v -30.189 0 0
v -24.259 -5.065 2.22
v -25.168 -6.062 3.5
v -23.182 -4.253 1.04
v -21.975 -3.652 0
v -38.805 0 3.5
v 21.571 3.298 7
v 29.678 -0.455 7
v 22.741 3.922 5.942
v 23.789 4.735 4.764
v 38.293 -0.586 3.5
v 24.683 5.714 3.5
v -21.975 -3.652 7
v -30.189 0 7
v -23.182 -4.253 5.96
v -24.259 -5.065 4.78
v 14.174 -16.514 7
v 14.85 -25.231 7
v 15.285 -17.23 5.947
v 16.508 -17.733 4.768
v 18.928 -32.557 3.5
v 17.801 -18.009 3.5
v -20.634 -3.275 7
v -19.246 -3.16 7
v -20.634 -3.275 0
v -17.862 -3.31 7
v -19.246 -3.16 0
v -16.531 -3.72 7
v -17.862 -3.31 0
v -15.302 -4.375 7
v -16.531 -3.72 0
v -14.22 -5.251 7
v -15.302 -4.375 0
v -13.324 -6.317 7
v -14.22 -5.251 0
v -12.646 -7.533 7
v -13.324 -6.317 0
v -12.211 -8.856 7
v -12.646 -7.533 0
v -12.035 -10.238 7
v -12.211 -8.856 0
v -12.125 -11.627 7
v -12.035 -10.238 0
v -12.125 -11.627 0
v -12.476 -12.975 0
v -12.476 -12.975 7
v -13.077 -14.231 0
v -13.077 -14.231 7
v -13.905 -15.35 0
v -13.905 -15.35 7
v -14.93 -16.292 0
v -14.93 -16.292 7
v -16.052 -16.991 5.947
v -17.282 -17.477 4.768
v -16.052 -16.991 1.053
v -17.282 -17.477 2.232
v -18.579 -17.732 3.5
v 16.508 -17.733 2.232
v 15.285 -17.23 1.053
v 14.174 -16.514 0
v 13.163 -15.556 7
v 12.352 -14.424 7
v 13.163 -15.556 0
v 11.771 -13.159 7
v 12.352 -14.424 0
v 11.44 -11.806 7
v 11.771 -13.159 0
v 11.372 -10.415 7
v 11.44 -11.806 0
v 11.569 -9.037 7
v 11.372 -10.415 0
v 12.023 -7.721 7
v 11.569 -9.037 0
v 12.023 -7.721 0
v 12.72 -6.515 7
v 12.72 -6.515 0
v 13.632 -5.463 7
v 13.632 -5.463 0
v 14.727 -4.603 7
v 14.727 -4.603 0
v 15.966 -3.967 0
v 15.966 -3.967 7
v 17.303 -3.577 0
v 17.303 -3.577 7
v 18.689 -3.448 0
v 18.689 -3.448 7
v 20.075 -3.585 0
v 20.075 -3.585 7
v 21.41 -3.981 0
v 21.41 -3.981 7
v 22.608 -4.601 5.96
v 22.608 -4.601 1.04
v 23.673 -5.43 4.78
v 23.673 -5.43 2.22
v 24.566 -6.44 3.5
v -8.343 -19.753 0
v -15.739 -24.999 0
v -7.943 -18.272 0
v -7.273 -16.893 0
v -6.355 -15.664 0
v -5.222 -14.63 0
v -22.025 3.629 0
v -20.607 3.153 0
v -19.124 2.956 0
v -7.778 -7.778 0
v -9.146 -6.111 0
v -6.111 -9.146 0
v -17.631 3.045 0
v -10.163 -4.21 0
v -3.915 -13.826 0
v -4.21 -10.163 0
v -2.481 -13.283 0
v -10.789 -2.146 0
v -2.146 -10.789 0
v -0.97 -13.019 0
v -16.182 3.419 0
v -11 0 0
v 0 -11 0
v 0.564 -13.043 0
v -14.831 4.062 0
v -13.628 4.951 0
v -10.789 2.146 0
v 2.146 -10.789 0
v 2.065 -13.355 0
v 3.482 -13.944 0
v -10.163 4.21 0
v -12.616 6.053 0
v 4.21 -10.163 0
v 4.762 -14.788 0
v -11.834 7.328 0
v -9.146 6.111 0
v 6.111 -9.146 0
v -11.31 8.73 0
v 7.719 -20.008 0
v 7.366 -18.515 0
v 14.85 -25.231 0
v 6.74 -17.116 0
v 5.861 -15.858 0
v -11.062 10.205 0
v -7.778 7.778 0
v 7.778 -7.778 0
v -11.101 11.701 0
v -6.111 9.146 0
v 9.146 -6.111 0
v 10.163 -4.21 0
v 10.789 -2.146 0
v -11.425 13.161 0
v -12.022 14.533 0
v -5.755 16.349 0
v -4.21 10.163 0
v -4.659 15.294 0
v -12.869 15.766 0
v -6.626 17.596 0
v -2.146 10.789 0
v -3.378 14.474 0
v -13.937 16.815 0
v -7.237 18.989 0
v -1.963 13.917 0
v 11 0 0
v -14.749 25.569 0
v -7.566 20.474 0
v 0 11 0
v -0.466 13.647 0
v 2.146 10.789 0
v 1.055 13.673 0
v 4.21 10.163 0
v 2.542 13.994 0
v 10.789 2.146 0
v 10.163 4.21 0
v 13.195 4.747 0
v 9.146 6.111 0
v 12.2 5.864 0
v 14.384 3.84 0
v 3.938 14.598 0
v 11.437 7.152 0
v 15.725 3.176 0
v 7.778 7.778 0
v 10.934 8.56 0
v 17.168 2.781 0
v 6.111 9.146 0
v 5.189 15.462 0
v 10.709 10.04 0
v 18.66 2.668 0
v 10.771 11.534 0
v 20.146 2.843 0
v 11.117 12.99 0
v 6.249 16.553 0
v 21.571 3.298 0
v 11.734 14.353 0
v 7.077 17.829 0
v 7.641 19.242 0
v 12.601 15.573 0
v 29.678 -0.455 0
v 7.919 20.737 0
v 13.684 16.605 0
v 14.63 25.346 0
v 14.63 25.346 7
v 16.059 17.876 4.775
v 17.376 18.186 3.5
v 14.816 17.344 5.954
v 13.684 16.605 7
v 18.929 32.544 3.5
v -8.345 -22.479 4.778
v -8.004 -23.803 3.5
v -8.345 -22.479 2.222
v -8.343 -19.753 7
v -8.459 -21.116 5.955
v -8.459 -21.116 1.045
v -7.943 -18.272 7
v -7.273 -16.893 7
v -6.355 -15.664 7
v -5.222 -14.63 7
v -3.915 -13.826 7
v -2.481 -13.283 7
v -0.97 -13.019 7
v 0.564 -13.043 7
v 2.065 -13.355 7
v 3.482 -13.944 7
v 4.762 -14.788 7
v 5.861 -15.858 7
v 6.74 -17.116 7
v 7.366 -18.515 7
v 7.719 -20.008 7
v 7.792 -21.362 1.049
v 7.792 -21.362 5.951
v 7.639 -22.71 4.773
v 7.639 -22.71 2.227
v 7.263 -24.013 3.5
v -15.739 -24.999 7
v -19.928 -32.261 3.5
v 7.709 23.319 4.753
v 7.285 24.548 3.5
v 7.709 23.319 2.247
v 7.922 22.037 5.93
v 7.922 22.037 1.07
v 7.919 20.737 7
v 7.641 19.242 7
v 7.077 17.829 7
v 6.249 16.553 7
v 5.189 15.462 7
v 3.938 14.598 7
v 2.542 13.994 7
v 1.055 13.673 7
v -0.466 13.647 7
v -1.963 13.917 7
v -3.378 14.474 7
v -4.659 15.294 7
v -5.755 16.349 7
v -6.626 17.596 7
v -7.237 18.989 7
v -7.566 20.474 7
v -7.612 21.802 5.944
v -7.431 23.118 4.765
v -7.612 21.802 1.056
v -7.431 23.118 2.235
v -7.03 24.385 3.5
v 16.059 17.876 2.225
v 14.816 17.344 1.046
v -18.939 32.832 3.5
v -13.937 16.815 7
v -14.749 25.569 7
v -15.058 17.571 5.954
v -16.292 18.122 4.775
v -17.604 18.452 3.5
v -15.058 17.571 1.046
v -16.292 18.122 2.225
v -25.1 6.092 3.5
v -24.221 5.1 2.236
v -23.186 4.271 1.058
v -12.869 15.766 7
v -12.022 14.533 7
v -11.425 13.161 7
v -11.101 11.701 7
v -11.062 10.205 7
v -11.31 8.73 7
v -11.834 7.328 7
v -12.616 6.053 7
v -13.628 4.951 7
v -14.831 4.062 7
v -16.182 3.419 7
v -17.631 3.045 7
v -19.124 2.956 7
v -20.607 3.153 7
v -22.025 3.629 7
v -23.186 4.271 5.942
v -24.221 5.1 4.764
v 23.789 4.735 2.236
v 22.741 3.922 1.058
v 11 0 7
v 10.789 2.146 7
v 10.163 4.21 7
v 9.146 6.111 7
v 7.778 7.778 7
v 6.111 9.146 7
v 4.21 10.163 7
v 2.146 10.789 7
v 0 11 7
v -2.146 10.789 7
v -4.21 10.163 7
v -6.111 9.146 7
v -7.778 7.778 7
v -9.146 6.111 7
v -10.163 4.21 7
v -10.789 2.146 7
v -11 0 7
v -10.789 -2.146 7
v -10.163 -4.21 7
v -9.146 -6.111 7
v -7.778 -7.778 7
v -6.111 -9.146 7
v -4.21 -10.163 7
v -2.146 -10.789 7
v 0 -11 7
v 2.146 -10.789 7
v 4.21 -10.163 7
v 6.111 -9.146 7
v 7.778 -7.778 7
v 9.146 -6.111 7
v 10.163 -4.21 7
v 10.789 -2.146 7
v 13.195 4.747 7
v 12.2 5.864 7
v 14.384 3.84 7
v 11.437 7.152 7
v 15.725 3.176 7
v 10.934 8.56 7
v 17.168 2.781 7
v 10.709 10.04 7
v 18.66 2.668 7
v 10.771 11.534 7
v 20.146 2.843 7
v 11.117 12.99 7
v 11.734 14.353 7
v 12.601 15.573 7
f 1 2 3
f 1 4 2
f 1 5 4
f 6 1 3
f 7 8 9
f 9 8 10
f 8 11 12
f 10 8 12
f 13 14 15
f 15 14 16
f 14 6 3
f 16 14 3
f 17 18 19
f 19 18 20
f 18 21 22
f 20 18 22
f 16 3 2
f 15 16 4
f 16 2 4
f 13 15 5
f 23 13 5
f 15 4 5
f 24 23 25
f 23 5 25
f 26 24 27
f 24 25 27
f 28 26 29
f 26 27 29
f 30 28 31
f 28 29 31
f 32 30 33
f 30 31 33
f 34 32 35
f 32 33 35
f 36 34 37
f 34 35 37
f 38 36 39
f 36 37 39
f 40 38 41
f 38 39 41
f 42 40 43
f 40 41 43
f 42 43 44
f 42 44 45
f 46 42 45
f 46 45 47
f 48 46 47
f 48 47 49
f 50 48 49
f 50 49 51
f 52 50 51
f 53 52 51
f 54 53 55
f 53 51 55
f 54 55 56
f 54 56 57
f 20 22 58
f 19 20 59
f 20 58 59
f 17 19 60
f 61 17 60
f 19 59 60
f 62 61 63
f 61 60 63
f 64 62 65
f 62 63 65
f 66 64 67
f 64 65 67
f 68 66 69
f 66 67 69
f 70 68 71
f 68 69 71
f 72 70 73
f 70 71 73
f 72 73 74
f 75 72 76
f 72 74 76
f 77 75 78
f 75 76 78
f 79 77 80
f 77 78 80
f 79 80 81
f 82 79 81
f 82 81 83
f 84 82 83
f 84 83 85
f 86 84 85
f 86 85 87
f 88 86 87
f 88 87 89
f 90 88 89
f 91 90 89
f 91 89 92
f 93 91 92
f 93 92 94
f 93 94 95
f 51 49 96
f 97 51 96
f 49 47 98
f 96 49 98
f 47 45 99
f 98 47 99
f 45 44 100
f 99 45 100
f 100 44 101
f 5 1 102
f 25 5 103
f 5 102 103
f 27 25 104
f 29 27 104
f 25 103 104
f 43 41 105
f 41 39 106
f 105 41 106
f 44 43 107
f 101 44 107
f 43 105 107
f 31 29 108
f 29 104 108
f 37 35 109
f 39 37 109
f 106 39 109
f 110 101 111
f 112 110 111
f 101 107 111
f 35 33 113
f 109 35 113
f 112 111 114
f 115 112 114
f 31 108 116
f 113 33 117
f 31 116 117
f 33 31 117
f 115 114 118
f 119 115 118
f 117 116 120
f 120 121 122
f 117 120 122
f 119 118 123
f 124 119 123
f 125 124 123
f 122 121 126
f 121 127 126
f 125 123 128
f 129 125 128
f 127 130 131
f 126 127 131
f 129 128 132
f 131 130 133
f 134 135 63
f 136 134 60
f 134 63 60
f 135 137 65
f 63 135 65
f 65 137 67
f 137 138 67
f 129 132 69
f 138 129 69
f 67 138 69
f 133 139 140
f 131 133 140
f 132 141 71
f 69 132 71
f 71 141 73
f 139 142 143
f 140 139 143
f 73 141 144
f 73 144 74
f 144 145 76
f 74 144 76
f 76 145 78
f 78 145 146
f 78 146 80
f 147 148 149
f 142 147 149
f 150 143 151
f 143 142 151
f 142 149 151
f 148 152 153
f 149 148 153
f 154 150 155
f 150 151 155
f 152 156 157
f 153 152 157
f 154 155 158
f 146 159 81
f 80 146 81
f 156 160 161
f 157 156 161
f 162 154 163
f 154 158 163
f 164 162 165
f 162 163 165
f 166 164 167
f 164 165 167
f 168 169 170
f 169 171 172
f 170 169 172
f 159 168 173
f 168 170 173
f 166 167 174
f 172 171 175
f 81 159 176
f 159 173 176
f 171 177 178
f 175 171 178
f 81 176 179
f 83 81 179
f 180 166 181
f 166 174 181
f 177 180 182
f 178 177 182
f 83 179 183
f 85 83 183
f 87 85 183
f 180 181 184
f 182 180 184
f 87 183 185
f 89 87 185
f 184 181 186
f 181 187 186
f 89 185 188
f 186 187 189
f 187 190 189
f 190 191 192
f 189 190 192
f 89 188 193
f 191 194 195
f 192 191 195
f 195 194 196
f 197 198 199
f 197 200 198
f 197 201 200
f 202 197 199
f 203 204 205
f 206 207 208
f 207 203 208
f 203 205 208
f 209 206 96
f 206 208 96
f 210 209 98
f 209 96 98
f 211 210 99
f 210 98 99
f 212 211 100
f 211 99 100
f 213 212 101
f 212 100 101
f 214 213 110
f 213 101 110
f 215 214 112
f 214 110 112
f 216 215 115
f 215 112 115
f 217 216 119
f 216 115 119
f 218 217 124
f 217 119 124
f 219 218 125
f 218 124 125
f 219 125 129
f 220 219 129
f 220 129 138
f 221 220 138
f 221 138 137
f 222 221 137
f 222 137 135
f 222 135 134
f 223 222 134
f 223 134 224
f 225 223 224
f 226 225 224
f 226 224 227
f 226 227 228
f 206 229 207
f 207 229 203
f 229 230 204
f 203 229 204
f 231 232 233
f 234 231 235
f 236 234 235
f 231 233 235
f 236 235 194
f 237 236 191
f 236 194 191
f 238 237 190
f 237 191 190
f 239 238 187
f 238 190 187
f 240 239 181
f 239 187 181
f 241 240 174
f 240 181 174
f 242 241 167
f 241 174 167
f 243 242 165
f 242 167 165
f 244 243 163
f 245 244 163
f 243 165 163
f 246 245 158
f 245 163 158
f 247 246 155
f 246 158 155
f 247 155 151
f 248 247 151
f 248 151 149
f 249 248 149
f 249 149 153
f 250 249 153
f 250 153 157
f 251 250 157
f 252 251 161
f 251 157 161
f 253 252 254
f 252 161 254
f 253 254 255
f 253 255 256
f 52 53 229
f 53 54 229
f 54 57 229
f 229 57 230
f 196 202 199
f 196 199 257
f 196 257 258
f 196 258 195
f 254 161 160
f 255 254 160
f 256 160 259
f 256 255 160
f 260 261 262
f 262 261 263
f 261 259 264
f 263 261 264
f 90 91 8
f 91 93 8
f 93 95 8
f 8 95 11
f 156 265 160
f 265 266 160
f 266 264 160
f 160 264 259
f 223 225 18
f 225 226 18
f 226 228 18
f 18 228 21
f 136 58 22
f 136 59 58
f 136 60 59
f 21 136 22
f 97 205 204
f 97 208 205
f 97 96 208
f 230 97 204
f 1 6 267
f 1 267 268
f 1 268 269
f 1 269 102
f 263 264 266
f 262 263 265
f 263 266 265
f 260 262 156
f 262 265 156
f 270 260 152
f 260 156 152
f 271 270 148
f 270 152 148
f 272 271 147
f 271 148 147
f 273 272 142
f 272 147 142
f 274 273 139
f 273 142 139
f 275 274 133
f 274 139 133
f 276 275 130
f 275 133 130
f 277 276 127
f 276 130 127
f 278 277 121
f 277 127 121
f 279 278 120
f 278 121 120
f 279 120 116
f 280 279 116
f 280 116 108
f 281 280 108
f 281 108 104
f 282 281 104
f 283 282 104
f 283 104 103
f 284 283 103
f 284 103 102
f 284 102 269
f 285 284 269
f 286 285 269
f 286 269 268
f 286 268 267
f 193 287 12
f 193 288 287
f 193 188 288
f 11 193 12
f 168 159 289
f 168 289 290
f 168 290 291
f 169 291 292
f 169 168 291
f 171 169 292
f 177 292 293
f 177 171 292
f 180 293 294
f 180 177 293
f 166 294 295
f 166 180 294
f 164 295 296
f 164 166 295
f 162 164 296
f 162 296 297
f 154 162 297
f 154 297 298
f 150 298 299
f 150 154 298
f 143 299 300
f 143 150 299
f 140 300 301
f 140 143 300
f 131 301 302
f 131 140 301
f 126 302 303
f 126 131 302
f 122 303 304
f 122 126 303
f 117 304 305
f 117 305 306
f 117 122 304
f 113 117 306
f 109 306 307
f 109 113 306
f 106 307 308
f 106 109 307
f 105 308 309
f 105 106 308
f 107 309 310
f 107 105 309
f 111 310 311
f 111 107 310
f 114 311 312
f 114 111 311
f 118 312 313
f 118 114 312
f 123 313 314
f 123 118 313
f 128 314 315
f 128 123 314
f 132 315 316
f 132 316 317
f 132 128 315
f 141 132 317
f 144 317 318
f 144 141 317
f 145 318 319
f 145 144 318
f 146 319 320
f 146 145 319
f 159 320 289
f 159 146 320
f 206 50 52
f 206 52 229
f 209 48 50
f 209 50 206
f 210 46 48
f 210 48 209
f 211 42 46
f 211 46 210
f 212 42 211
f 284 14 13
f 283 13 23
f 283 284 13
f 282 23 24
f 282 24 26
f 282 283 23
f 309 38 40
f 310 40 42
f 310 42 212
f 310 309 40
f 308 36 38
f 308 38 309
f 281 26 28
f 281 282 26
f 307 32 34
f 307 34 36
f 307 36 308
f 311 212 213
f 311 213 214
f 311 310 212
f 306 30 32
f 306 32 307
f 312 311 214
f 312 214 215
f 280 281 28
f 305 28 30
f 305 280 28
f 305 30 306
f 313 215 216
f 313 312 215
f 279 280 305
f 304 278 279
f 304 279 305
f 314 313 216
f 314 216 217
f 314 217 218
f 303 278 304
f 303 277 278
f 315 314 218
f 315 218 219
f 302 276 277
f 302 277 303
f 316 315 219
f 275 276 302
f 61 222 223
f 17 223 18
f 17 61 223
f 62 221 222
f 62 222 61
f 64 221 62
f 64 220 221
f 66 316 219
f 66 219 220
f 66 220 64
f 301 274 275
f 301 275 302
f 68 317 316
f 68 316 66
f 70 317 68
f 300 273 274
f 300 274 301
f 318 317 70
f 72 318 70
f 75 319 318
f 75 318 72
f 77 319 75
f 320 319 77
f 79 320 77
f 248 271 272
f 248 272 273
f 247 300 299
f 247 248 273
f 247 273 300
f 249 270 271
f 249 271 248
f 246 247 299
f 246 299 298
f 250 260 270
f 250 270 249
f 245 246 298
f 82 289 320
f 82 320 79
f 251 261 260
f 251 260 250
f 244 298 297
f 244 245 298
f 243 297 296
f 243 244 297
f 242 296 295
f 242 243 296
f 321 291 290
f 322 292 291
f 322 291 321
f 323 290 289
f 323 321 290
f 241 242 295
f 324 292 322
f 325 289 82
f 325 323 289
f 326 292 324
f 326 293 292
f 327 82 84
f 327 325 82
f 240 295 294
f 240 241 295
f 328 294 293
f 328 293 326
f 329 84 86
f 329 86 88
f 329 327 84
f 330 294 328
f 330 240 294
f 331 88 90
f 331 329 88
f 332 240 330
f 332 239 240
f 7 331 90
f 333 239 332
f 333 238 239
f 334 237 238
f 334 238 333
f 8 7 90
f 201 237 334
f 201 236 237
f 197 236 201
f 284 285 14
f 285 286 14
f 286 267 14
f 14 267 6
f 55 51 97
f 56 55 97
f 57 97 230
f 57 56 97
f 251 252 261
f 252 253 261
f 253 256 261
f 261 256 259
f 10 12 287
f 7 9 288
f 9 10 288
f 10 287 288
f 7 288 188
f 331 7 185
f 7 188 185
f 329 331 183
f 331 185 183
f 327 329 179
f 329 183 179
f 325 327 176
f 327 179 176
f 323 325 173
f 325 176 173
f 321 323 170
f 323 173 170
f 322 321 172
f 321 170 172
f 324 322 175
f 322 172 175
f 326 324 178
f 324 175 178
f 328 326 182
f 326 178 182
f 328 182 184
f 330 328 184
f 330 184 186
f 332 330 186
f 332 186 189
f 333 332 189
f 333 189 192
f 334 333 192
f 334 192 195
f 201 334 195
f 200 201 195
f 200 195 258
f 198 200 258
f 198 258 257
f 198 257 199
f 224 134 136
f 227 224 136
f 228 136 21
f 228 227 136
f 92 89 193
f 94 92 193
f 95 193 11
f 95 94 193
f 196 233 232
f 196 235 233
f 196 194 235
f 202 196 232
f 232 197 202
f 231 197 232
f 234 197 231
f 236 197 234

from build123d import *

# Parameters (mm, degrees)
F0_R         = 11
F1_DEPTH     = 7
F2_SIZE      = 3.81
F3_T1_DEPTH  = 34.6394313852
F3_T3_DEPTH  = 34.3439110976
F4_SIZE      = 3.81
F5_T1_DEPTH  = 35.2279158768
F5_T3_DEPTH  = 35.1515641575
F5_T5_DEPTH  = 34.8076073963
F5_T7_DEPTH  = 34.8076073963
F5_T9_DEPTH  = 34.5979192148
F5_T11_DEPTH = 35.1515641575
F5_T13_DEPTH = 35.2279158768
F5_T15_DEPTH = 34.6394313852
F5_T17_DEPTH = 34.8076073963
F6_T1_DEPTH  = 29.7856896268


# Not quite as in the source:
# - a fillet or chamfer that OpenCascade refuses, or shapes differently, is made with other operations: its cross-section is extruded or revolved along the edge and cut away or added


with BuildPart() as f1:
    # F0 (on Top) → F1 (new body)
    with BuildSketch(Plane.XY):
        with BuildLine():
            Line((-19.3098304855, 33.4750442975), (-17.9191186068, 18.4962593726))
            ThreePointArc((-17.9191186068, 18.4962593726), (-12.1734101316, 6.7065768921), (-25.2838117957, 6.35))
            Line((-25.2838117957, 6.35), (-39.5676235915, 0))
            Line((-39.5676235915, 0), (-25.3535799067, -6.3189839441))
            ThreePointArc((-25.3535799067, -6.3189839441), (-12.9763127609, -6.8724869317), (-18.8926645602, -17.7582523592))
            Line((-18.8926645602, -17.7582523592), (-20.2989239466, -32.9044930863))
            Line((-20.2989239466, -32.9044930863), (-7.891724267, -24.1040629982))
            ThreePointArc((-7.891724267, -24.1040629982), (-0.2207247048, -12.9944902326), (7.1436805269, -24.3096295115))
            Line((7.1436805269, -24.3096295115), (19.2464965418, -33.1737534264))
            Line((19.2464965418, -33.1737534264), (19.2872961226, -33.1740312262))
            Line((19.2872961226, -33.1740312262), (18.113880894, -18.0395493303))
            ThreePointArc((18.113880894, -18.0395493303), (12.3636945983, -7.0651033251), (24.7479456966, -6.6998194754))
            Line((24.7479456966, -6.6998194754), (39.056406052, -0.5976429607))
            Line((39.056406052, -0.5976429607), (24.8707754105, 5.9687611329))
            ThreePointArc((24.8707754105, 5.9687611329), (11.7673092468, 6.524596873), (17.6915767021, 18.225572644))
            Line((17.6915767021, 18.225572644), (19.3098304855, 33.1814855899))
            Line((19.3098304855, 33.1814855899), (7.1525325905, 24.8331700857))
            ThreePointArc((7.1525325905, 24.8331700857), (0.2505296838, 13.6219778067), (-6.9026308059, 24.6746142094))
            Line((-6.9026308059, 24.6746142094), (-19.3098304855, 33.4750442975))
        make_face()
        Circle(F0_R, mode=Mode.SUBTRACT)
    extrude(amount=F1_DEPTH)

    # F2
    f2_edges = [f1.edges().sort_by_distance(p)[0] for p in [
        (18.500704, 25.703529, 7),
        (13.231182, 29.007328, 7),
    ]]
    chamfer(f2_edges, length=F2_SIZE)

    # F3: chamfer of 3.81 on 2 edges, made by hand

    # F3_s2 → F3_t1 (cut)
    with BuildSketch(Plane(origin=(1.0999249917, 10.1655145758, 0), x_dir=(0, 0, 1), z_dir=(0.1075737229, 0.9941971103, 0))):
        Polygon((3.81, 15.6283217323), (0, 11.8183217323), (0, 15.6283217323), align=None)
    extrude(amount=F3_T1_DEPTH, mode=Mode.SUBTRACT)

    # F3_s4 → F3_t3 (cut)
    with BuildSketch(Plane(origin=(36.6832724438, 25.190098551, 0), x_dir=(0, 0, 1), z_dir=(-0.8243528709, -0.5660762706, 0))):
        Polygon((0, 12.6124160802), (3.81, 16.4224160802), (0, 16.4224160802), align=None)
    extrude(amount=F3_T3_DEPTH, mode=Mode.SUBTRACT)

    # F4 (call 1 of 6: OpenCascade refuses the feature's edges together)
    f4_edges = [f1.edges().sort_by_distance(p)[0] for p in [
        (31.902176, -3.648731, 7),
        (31.963591, 2.685559, 7),
    ]]
    chamfer(f4_edges, length=F4_SIZE)

    # F4#2 (call 2 of 6)
    f4_2_edges = [f1.edges().sort_by_distance(p)[0] for p in [
        (18.700589, -25.60679, 7),
    ]]
    chamfer(f4_2_edges, length=F4_SIZE)

    # F4#3 (call 3 of 6)
    f4_3_edges = [f1.edges().sort_by_distance(p)[0] for p in [
        (13.195089, -28.741691, 7),
    ]]
    chamfer(f4_3_edges, length=F4_SIZE)

    # F4#4 (call 4 of 6)
    f4_4_edges = [f1.edges().sort_by_distance(p)[0] for p in [
        (-14.095324, -28.504278, 7),
        (-19.595794, -25.331373, 7),
    ]]
    chamfer(f4_4_edges, length=F4_SIZE)

    # F4#5 (call 5 of 6)
    f4_5_edges = [f1.edges().sort_by_distance(p)[0] for p in [
        (-32.460602, -3.159492, 7),
        (-32.425718, 3.175, 7),
    ]]
    chamfer(f4_5_edges, length=F4_SIZE)

    # F4#6 (call 6 of 6)
    f4_6_edges = [f1.edges().sort_by_distance(p)[0] for p in [
        (-18.614475, 25.985652, 7),
        (-13.106231, 29.074829, 7),
    ]]
    chamfer(f4_6_edges, length=F4_SIZE)

    # F5: chamfer of 3.81 on 9 edges, made by hand

    # F5_s2 → F5_t1 (cut)
    with BuildSketch(Plane(origin=(41.2840936669, -19.1100451228, 0), x_dir=(0, 0, 1), z_dir=(-0.9074917218, 0.4200699643, 0))):
        Polygon((0, 12.0540670557), (3.81, 15.8640670557), (0, 15.8640670557), align=None)
    extrude(amount=F5_T1_DEPTH, mode=Mode.SUBTRACT)

    # F5_s4 → F5_t3 (cut)
    with BuildSketch(Plane(origin=(9.5091795604, 4.0554113263, 0), x_dir=(0, 0, 1), z_dir=(0.9198423531, 0.3922882173, 0))):
        Polygon((0, 12.0611052097), (3.81, 15.8711052097), (0, 15.8711052097), align=None)
    extrude(amount=F5_T3_DEPTH, mode=Mode.SUBTRACT)

    # F5_s6 → F5_t5 (cut)
    with BuildSketch(Plane(origin=(-37.0237803275, -26.260977399, 0), x_dir=(0, 0, 1), z_dir=(0.8156523083, 0.5785424029, 0))):
        Polygon((0, 11.2848375041), (3.81, 15.0948375041), (0, 15.0948375041), align=None)
    extrude(amount=F5_T5_DEPTH, mode=Mode.SUBTRACT)

    # F5_s8 → F5_t7 (cut)
    with BuildSketch(Plane(origin=(-0.8903351992, -9.5894337742, 0), x_dir=(0, 0, 1), z_dir=(-0.0924478322, -0.9957175294, 0))):
        Polygon((0, 13.3600453443), (3.81, 17.1700453443), (0, 17.1700453443), align=None)
    extrude(amount=F5_T7_DEPTH, mode=Mode.SUBTRACT)

    # F5_s10 → F5_t9 (cut)
    with BuildSketch(Plane(origin=(8.3331341524, -6.1032022329, 0), x_dir=(0, 0, 1), z_dir=(0.806763245, -0.5908748315, 0))):
        Polygon((0, 11.5810945617), (3.81, 15.3910945617), (0, 15.3910945617), align=None)
    extrude(amount=F5_T9_DEPTH, mode=Mode.SUBTRACT)

    # F5_s12 → F5_t11 (cut)
    with BuildSketch(Plane(origin=(-41.9914373351, 18.6676799506, 0), x_dir=(0, 0, 1), z_dir=(0.9137726258, -0.406226031, 0))):
        Polygon((0, 12.2633986894), (3.81, 16.0733986894), (0, 16.0733986894), align=None)
    extrude(amount=F5_T11_DEPTH, mode=Mode.SUBTRACT)

    # F5_s14 → F5_t13 (cut)
    with BuildSketch(Plane(origin=(-9.8011321421, -4.357183502, 0), x_dir=(0, 0, 1), z_dir=(-0.9137726258, -0.406226031, 0))):
        Polygon((3.81, 16.0733986894), (0, 12.2633986894), (0, 16.0733986894), align=None)
    extrude(amount=F5_T13_DEPTH, mode=Mode.SUBTRACT)

    # F5_s16 → F5_t15 (cut)
    with BuildSketch(Plane(origin=(-4.1522899993, 44.7226055925, 0), x_dir=(0, 0, 1), z_dir=(0.0924478322, -0.9957175294, 0))):
        Polygon((3.81, 16.1324414242), (0, 12.3224414242), (0, 16.1324414242), align=None)
    extrude(amount=F5_T15_DEPTH, mode=Mode.SUBTRACT)

    # F5_s18 → F5_t17 (cut)
    with BuildSketch(Plane(origin=(-8.2440794116, 5.8475277562, 0), x_dir=(0, 0, 1), z_dir=(-0.8156523083, 0.5785424029, 0))):
        Polygon((0, 12.3224414242), (3.81, 16.1324414242), (0, 16.1324414242), align=None)
    extrude(amount=F5_T17_DEPTH, mode=Mode.SUBTRACT)

    # F6: chamfer of 3.81 on 1 edges, made by hand

    # F6_s2 → F6_t1 (cut)
    with BuildSketch(Plane(origin=(3.0435836487, -39.2555512393, 0), x_dir=(0, 0, 1), z_dir=(-0.0773005765, 0.9970078339, 0))):
        Polygon((0, 12.8552135911), (3.81, 16.6652135911), (0, 16.6652135911), align=None)
    extrude(amount=F6_T1_DEPTH, mode=Mode.SUBTRACT)


solid = f1.part
